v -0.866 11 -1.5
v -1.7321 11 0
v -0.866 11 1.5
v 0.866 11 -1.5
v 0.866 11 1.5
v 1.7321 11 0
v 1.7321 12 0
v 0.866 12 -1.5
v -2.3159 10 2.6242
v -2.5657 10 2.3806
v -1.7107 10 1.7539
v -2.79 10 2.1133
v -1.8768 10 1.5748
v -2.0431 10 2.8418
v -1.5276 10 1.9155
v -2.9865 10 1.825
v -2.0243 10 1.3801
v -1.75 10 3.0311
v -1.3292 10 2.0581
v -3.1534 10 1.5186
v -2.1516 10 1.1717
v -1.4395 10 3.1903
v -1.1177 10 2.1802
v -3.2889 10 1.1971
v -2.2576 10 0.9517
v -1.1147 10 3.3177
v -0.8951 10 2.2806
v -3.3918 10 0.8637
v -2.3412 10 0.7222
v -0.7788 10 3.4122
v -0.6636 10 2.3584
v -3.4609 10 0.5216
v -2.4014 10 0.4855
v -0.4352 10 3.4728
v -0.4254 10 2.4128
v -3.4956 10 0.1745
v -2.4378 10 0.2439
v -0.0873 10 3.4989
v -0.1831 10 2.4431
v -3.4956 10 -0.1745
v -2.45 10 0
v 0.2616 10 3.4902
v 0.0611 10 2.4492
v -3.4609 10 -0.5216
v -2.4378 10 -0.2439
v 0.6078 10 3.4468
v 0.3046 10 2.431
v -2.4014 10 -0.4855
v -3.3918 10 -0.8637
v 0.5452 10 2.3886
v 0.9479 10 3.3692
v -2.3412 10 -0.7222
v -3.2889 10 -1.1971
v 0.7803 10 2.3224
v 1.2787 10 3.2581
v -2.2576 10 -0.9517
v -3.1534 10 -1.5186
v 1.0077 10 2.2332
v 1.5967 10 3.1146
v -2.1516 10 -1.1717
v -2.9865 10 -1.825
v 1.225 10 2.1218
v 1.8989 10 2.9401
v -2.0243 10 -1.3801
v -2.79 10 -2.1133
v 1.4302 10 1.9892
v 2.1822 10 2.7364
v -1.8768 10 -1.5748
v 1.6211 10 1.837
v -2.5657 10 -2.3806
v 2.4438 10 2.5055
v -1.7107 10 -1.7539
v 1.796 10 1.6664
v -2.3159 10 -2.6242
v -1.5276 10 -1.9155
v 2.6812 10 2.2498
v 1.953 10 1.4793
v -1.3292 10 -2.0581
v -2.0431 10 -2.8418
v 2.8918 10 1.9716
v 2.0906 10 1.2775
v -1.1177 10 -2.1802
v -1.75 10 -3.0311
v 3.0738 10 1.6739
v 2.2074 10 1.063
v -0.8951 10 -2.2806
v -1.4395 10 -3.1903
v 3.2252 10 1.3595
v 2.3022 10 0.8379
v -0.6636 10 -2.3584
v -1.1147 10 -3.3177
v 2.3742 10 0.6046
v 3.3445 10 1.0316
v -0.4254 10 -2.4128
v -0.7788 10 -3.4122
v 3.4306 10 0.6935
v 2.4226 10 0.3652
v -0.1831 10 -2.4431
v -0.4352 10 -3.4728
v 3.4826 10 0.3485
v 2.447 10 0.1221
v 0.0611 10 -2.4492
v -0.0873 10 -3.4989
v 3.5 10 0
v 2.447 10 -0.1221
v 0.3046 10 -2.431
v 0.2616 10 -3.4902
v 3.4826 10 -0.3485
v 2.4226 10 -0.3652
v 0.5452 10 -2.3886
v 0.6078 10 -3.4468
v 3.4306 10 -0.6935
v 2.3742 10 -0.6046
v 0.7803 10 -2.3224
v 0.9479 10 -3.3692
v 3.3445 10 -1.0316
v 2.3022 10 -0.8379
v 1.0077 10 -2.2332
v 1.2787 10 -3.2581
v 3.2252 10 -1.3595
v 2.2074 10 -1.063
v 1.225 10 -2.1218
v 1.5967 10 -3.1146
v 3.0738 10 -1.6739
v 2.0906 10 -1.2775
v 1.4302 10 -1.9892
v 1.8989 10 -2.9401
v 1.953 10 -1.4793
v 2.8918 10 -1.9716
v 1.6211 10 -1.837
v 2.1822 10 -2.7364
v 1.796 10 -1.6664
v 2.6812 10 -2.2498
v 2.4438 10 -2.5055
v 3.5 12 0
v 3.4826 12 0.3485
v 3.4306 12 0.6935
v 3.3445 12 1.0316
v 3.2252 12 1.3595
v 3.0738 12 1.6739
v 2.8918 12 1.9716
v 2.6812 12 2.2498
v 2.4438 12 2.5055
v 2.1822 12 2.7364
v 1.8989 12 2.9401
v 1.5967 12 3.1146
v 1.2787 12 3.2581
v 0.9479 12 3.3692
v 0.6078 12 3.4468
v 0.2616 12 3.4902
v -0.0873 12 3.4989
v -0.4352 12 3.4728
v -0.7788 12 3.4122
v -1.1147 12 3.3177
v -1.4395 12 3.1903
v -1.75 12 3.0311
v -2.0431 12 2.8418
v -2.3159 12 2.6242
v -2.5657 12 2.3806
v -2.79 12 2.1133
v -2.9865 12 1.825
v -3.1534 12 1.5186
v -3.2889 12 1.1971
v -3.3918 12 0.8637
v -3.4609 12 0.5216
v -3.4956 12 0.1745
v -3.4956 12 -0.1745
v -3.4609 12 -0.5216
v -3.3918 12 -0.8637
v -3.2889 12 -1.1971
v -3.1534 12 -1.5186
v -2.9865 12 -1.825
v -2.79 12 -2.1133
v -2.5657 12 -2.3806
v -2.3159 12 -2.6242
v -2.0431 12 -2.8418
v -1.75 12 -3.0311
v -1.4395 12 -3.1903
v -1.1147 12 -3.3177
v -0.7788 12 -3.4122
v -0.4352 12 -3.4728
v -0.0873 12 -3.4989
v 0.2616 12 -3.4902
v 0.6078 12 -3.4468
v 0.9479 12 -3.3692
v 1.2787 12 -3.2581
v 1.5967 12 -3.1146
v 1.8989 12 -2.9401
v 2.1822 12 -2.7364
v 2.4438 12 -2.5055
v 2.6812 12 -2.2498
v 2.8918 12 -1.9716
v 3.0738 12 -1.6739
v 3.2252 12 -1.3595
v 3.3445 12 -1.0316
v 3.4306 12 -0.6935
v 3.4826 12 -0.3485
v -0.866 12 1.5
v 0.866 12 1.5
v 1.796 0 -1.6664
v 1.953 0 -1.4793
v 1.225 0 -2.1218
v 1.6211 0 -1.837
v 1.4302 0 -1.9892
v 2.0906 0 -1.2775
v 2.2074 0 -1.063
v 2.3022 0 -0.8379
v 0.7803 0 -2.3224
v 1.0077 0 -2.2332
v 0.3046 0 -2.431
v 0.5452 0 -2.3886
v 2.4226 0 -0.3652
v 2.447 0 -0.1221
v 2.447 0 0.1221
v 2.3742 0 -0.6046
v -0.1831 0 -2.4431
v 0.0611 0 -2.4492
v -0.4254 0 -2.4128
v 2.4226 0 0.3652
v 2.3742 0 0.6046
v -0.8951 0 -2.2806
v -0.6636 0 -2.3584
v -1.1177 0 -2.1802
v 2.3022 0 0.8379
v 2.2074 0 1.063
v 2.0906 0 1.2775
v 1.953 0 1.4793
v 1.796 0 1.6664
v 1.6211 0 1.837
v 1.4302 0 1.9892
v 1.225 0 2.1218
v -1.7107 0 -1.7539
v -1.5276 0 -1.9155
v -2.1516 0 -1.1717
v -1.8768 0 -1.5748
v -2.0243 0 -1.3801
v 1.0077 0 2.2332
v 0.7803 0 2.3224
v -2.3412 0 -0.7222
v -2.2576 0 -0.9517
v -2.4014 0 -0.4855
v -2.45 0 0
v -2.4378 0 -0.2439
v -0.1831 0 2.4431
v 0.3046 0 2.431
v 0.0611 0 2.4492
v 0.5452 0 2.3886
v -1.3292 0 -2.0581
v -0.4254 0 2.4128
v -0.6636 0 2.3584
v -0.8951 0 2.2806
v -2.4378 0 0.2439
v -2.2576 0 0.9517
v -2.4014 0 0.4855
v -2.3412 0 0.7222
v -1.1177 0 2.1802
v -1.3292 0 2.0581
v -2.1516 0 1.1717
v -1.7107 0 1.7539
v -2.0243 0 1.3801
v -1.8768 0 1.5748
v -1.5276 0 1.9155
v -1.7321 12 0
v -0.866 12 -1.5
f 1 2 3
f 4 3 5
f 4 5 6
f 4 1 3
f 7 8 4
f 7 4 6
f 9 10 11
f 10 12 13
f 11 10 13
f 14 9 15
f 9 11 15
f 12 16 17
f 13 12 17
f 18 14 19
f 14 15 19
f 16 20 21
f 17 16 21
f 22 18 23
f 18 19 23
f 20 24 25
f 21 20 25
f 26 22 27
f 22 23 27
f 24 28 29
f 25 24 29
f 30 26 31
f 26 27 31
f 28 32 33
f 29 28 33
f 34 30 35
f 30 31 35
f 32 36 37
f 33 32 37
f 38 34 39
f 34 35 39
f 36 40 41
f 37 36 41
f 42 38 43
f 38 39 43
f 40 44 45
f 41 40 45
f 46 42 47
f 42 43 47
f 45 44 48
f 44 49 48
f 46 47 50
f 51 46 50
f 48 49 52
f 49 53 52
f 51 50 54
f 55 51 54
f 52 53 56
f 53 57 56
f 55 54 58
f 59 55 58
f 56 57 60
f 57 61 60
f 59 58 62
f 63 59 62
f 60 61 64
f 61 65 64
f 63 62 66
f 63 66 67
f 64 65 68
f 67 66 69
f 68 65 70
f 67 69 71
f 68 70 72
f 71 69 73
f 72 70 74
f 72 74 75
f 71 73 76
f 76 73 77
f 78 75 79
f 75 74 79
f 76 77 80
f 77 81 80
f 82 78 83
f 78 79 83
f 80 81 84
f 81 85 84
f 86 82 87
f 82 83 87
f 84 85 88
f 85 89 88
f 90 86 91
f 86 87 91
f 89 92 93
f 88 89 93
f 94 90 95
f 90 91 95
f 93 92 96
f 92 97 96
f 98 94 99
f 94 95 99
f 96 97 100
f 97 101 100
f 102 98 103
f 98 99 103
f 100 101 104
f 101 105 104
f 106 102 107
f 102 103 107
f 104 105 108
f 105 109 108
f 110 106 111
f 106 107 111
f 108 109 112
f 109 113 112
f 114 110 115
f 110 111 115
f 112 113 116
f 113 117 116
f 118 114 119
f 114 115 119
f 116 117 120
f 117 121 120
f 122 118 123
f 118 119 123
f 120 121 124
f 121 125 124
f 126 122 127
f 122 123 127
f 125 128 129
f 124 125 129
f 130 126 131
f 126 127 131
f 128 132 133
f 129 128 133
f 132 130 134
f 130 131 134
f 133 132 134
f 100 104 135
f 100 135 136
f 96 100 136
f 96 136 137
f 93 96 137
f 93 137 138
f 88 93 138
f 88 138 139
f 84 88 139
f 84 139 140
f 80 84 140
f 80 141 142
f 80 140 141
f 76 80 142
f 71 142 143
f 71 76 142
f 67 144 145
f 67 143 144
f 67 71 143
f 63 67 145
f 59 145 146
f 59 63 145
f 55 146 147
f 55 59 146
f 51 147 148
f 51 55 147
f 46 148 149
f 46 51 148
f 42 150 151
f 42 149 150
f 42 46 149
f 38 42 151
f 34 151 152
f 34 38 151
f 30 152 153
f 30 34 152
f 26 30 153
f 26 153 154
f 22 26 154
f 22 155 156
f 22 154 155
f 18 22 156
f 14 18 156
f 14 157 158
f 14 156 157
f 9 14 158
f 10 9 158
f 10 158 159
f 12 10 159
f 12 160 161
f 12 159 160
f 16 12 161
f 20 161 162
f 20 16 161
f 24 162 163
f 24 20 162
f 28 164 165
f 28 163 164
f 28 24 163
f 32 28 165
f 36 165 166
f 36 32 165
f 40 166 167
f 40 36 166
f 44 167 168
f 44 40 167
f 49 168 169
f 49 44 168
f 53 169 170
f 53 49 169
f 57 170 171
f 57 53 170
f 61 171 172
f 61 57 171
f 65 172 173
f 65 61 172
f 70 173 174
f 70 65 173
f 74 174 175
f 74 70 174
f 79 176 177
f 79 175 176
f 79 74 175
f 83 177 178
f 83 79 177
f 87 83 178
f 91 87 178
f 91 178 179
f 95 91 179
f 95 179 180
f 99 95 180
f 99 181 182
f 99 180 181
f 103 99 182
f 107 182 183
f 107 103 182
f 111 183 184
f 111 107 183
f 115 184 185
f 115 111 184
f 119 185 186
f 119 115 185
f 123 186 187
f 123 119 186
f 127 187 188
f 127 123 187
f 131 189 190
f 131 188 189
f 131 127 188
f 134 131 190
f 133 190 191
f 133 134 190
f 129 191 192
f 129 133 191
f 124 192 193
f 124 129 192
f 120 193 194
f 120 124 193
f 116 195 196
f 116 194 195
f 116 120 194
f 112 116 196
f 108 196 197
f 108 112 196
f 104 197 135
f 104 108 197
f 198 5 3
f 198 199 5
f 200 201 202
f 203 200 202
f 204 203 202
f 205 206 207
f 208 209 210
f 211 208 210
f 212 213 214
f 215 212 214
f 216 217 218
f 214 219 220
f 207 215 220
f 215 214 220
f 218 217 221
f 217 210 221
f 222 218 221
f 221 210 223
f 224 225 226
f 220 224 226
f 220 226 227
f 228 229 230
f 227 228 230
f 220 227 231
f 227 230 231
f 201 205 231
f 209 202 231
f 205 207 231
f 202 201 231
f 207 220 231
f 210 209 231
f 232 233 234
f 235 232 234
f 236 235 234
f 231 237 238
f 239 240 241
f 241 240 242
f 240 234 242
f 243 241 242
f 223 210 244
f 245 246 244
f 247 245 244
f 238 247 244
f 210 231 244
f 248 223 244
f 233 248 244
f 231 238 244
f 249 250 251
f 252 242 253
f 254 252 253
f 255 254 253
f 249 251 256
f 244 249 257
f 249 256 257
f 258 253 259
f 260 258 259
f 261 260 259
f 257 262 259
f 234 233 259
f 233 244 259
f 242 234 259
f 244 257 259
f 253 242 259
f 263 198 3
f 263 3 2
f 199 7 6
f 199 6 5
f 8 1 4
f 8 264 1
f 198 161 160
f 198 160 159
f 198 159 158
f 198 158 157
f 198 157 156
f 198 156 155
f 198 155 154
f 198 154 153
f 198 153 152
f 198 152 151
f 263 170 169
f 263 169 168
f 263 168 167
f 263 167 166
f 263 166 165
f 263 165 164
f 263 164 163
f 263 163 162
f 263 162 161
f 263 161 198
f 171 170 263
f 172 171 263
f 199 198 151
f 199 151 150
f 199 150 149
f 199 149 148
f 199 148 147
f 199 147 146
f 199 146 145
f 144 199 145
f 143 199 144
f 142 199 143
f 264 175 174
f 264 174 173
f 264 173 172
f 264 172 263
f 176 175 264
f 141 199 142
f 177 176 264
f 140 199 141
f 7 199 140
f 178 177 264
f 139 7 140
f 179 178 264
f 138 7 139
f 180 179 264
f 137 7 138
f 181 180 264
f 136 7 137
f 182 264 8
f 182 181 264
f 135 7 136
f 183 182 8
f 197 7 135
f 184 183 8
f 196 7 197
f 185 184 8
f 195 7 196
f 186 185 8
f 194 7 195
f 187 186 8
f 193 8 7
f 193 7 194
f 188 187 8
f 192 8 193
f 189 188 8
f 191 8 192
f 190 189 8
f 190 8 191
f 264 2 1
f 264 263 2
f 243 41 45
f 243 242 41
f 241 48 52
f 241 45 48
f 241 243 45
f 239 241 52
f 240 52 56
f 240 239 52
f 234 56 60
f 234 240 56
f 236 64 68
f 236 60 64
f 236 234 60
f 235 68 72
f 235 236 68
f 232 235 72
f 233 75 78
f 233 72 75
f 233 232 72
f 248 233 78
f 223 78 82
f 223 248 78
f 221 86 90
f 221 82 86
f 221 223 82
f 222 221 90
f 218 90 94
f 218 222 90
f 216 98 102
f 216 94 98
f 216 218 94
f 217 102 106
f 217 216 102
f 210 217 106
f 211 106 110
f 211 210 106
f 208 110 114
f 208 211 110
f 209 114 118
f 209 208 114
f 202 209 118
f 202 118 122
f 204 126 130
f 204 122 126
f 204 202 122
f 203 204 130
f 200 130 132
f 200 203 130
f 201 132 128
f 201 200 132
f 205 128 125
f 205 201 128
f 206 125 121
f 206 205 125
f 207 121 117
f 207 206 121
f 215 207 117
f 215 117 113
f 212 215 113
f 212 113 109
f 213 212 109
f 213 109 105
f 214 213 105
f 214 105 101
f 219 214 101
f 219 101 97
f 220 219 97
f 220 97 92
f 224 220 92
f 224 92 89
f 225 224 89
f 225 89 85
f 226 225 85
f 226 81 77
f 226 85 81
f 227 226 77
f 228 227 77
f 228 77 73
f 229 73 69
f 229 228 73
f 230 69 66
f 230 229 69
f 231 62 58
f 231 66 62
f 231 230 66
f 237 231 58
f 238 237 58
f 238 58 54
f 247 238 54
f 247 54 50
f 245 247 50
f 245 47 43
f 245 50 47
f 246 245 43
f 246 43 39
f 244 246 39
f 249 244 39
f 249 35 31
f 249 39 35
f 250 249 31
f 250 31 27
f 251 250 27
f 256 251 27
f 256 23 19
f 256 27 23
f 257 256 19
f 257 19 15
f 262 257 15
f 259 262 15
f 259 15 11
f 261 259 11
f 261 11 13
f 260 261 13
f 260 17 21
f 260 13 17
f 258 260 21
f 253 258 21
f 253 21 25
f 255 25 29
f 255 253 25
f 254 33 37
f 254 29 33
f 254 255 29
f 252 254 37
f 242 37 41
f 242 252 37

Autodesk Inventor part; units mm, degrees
ref_plane "YZ Plane" through (0, 0, 0) normal (1, 0, 0) x (0, 1, 0)
ref_plane "XZ Plane" through (0, 0, 0) normal (0, 1, 0) x (-1, 0, 0)
ref_plane "XY Plane" through (0, 0, 0) normal (0, 0, 1) x (1, 0, 0)
sketch "Sketch1" plane through (0, 0, 0) normal (0, 1, 0) x (-1, 0, 0)
  circle A0 centre (0, 0) radius 2.45
  dimension "d0" = 4.9
extrude "Extrusion1" add sketch "Sketch1" along normal blind 10
sketch "Sketch2" plane through (0, 10, 0) normal (0, 1, 0) x (1, 0, 0)
  circle A0 centre (0, 0) radius 3.5
  dimension "d3" = 7
extrude "Extrusion2" add sketch "Sketch2" along normal blind 2
thread "Thread1" size "M5x0.8" class "6g" standard "ANSI Metric M Profile" full length
sketch "Sketch3" plane through (0, 12, 0) normal (0, 1, 0) x (1, 0, 0)
  line L0 (0.866, 1.5) -> (1.7321, 0)
  line L1 (1.7321, 0) -> (0.866, -1.5)
  line L2 (0.866, -1.5) -> (-0.866, -1.5)
  line L3 (-0.866, -1.5) -> (-1.7321, 0)
  line L4 (-1.7321, 0) -> (-0.866, 1.5)
  line L5 (-0.866, 1.5) -> (0.866, 1.5)
  point P0 (0, 0)
  point P1 (0, 0)
  dimension "d8" = 3
extrude "Extrusion3" cut sketch "Sketch3" against normal blind 1
equation "\"BendRadius\" = Thickness"
equation "\"BendReliefWidth\" = Thickness"
equation "\"BendReliefDepth\" = 0.5 * Thickness"
equation "\"CornerReliefSize\" = 4 * Thickness"
equation "\"MinimumRemnant\" = 2 * Thickness"
equation "\"TransitionRadius\" = BendRadius"
equation "\"JacobiRadiusSize\" = BendRadius"
equation "\"GapSize\" = Thickness"
equation "\"Thickness\" = 0.5"
properties part number "perno_simple"
